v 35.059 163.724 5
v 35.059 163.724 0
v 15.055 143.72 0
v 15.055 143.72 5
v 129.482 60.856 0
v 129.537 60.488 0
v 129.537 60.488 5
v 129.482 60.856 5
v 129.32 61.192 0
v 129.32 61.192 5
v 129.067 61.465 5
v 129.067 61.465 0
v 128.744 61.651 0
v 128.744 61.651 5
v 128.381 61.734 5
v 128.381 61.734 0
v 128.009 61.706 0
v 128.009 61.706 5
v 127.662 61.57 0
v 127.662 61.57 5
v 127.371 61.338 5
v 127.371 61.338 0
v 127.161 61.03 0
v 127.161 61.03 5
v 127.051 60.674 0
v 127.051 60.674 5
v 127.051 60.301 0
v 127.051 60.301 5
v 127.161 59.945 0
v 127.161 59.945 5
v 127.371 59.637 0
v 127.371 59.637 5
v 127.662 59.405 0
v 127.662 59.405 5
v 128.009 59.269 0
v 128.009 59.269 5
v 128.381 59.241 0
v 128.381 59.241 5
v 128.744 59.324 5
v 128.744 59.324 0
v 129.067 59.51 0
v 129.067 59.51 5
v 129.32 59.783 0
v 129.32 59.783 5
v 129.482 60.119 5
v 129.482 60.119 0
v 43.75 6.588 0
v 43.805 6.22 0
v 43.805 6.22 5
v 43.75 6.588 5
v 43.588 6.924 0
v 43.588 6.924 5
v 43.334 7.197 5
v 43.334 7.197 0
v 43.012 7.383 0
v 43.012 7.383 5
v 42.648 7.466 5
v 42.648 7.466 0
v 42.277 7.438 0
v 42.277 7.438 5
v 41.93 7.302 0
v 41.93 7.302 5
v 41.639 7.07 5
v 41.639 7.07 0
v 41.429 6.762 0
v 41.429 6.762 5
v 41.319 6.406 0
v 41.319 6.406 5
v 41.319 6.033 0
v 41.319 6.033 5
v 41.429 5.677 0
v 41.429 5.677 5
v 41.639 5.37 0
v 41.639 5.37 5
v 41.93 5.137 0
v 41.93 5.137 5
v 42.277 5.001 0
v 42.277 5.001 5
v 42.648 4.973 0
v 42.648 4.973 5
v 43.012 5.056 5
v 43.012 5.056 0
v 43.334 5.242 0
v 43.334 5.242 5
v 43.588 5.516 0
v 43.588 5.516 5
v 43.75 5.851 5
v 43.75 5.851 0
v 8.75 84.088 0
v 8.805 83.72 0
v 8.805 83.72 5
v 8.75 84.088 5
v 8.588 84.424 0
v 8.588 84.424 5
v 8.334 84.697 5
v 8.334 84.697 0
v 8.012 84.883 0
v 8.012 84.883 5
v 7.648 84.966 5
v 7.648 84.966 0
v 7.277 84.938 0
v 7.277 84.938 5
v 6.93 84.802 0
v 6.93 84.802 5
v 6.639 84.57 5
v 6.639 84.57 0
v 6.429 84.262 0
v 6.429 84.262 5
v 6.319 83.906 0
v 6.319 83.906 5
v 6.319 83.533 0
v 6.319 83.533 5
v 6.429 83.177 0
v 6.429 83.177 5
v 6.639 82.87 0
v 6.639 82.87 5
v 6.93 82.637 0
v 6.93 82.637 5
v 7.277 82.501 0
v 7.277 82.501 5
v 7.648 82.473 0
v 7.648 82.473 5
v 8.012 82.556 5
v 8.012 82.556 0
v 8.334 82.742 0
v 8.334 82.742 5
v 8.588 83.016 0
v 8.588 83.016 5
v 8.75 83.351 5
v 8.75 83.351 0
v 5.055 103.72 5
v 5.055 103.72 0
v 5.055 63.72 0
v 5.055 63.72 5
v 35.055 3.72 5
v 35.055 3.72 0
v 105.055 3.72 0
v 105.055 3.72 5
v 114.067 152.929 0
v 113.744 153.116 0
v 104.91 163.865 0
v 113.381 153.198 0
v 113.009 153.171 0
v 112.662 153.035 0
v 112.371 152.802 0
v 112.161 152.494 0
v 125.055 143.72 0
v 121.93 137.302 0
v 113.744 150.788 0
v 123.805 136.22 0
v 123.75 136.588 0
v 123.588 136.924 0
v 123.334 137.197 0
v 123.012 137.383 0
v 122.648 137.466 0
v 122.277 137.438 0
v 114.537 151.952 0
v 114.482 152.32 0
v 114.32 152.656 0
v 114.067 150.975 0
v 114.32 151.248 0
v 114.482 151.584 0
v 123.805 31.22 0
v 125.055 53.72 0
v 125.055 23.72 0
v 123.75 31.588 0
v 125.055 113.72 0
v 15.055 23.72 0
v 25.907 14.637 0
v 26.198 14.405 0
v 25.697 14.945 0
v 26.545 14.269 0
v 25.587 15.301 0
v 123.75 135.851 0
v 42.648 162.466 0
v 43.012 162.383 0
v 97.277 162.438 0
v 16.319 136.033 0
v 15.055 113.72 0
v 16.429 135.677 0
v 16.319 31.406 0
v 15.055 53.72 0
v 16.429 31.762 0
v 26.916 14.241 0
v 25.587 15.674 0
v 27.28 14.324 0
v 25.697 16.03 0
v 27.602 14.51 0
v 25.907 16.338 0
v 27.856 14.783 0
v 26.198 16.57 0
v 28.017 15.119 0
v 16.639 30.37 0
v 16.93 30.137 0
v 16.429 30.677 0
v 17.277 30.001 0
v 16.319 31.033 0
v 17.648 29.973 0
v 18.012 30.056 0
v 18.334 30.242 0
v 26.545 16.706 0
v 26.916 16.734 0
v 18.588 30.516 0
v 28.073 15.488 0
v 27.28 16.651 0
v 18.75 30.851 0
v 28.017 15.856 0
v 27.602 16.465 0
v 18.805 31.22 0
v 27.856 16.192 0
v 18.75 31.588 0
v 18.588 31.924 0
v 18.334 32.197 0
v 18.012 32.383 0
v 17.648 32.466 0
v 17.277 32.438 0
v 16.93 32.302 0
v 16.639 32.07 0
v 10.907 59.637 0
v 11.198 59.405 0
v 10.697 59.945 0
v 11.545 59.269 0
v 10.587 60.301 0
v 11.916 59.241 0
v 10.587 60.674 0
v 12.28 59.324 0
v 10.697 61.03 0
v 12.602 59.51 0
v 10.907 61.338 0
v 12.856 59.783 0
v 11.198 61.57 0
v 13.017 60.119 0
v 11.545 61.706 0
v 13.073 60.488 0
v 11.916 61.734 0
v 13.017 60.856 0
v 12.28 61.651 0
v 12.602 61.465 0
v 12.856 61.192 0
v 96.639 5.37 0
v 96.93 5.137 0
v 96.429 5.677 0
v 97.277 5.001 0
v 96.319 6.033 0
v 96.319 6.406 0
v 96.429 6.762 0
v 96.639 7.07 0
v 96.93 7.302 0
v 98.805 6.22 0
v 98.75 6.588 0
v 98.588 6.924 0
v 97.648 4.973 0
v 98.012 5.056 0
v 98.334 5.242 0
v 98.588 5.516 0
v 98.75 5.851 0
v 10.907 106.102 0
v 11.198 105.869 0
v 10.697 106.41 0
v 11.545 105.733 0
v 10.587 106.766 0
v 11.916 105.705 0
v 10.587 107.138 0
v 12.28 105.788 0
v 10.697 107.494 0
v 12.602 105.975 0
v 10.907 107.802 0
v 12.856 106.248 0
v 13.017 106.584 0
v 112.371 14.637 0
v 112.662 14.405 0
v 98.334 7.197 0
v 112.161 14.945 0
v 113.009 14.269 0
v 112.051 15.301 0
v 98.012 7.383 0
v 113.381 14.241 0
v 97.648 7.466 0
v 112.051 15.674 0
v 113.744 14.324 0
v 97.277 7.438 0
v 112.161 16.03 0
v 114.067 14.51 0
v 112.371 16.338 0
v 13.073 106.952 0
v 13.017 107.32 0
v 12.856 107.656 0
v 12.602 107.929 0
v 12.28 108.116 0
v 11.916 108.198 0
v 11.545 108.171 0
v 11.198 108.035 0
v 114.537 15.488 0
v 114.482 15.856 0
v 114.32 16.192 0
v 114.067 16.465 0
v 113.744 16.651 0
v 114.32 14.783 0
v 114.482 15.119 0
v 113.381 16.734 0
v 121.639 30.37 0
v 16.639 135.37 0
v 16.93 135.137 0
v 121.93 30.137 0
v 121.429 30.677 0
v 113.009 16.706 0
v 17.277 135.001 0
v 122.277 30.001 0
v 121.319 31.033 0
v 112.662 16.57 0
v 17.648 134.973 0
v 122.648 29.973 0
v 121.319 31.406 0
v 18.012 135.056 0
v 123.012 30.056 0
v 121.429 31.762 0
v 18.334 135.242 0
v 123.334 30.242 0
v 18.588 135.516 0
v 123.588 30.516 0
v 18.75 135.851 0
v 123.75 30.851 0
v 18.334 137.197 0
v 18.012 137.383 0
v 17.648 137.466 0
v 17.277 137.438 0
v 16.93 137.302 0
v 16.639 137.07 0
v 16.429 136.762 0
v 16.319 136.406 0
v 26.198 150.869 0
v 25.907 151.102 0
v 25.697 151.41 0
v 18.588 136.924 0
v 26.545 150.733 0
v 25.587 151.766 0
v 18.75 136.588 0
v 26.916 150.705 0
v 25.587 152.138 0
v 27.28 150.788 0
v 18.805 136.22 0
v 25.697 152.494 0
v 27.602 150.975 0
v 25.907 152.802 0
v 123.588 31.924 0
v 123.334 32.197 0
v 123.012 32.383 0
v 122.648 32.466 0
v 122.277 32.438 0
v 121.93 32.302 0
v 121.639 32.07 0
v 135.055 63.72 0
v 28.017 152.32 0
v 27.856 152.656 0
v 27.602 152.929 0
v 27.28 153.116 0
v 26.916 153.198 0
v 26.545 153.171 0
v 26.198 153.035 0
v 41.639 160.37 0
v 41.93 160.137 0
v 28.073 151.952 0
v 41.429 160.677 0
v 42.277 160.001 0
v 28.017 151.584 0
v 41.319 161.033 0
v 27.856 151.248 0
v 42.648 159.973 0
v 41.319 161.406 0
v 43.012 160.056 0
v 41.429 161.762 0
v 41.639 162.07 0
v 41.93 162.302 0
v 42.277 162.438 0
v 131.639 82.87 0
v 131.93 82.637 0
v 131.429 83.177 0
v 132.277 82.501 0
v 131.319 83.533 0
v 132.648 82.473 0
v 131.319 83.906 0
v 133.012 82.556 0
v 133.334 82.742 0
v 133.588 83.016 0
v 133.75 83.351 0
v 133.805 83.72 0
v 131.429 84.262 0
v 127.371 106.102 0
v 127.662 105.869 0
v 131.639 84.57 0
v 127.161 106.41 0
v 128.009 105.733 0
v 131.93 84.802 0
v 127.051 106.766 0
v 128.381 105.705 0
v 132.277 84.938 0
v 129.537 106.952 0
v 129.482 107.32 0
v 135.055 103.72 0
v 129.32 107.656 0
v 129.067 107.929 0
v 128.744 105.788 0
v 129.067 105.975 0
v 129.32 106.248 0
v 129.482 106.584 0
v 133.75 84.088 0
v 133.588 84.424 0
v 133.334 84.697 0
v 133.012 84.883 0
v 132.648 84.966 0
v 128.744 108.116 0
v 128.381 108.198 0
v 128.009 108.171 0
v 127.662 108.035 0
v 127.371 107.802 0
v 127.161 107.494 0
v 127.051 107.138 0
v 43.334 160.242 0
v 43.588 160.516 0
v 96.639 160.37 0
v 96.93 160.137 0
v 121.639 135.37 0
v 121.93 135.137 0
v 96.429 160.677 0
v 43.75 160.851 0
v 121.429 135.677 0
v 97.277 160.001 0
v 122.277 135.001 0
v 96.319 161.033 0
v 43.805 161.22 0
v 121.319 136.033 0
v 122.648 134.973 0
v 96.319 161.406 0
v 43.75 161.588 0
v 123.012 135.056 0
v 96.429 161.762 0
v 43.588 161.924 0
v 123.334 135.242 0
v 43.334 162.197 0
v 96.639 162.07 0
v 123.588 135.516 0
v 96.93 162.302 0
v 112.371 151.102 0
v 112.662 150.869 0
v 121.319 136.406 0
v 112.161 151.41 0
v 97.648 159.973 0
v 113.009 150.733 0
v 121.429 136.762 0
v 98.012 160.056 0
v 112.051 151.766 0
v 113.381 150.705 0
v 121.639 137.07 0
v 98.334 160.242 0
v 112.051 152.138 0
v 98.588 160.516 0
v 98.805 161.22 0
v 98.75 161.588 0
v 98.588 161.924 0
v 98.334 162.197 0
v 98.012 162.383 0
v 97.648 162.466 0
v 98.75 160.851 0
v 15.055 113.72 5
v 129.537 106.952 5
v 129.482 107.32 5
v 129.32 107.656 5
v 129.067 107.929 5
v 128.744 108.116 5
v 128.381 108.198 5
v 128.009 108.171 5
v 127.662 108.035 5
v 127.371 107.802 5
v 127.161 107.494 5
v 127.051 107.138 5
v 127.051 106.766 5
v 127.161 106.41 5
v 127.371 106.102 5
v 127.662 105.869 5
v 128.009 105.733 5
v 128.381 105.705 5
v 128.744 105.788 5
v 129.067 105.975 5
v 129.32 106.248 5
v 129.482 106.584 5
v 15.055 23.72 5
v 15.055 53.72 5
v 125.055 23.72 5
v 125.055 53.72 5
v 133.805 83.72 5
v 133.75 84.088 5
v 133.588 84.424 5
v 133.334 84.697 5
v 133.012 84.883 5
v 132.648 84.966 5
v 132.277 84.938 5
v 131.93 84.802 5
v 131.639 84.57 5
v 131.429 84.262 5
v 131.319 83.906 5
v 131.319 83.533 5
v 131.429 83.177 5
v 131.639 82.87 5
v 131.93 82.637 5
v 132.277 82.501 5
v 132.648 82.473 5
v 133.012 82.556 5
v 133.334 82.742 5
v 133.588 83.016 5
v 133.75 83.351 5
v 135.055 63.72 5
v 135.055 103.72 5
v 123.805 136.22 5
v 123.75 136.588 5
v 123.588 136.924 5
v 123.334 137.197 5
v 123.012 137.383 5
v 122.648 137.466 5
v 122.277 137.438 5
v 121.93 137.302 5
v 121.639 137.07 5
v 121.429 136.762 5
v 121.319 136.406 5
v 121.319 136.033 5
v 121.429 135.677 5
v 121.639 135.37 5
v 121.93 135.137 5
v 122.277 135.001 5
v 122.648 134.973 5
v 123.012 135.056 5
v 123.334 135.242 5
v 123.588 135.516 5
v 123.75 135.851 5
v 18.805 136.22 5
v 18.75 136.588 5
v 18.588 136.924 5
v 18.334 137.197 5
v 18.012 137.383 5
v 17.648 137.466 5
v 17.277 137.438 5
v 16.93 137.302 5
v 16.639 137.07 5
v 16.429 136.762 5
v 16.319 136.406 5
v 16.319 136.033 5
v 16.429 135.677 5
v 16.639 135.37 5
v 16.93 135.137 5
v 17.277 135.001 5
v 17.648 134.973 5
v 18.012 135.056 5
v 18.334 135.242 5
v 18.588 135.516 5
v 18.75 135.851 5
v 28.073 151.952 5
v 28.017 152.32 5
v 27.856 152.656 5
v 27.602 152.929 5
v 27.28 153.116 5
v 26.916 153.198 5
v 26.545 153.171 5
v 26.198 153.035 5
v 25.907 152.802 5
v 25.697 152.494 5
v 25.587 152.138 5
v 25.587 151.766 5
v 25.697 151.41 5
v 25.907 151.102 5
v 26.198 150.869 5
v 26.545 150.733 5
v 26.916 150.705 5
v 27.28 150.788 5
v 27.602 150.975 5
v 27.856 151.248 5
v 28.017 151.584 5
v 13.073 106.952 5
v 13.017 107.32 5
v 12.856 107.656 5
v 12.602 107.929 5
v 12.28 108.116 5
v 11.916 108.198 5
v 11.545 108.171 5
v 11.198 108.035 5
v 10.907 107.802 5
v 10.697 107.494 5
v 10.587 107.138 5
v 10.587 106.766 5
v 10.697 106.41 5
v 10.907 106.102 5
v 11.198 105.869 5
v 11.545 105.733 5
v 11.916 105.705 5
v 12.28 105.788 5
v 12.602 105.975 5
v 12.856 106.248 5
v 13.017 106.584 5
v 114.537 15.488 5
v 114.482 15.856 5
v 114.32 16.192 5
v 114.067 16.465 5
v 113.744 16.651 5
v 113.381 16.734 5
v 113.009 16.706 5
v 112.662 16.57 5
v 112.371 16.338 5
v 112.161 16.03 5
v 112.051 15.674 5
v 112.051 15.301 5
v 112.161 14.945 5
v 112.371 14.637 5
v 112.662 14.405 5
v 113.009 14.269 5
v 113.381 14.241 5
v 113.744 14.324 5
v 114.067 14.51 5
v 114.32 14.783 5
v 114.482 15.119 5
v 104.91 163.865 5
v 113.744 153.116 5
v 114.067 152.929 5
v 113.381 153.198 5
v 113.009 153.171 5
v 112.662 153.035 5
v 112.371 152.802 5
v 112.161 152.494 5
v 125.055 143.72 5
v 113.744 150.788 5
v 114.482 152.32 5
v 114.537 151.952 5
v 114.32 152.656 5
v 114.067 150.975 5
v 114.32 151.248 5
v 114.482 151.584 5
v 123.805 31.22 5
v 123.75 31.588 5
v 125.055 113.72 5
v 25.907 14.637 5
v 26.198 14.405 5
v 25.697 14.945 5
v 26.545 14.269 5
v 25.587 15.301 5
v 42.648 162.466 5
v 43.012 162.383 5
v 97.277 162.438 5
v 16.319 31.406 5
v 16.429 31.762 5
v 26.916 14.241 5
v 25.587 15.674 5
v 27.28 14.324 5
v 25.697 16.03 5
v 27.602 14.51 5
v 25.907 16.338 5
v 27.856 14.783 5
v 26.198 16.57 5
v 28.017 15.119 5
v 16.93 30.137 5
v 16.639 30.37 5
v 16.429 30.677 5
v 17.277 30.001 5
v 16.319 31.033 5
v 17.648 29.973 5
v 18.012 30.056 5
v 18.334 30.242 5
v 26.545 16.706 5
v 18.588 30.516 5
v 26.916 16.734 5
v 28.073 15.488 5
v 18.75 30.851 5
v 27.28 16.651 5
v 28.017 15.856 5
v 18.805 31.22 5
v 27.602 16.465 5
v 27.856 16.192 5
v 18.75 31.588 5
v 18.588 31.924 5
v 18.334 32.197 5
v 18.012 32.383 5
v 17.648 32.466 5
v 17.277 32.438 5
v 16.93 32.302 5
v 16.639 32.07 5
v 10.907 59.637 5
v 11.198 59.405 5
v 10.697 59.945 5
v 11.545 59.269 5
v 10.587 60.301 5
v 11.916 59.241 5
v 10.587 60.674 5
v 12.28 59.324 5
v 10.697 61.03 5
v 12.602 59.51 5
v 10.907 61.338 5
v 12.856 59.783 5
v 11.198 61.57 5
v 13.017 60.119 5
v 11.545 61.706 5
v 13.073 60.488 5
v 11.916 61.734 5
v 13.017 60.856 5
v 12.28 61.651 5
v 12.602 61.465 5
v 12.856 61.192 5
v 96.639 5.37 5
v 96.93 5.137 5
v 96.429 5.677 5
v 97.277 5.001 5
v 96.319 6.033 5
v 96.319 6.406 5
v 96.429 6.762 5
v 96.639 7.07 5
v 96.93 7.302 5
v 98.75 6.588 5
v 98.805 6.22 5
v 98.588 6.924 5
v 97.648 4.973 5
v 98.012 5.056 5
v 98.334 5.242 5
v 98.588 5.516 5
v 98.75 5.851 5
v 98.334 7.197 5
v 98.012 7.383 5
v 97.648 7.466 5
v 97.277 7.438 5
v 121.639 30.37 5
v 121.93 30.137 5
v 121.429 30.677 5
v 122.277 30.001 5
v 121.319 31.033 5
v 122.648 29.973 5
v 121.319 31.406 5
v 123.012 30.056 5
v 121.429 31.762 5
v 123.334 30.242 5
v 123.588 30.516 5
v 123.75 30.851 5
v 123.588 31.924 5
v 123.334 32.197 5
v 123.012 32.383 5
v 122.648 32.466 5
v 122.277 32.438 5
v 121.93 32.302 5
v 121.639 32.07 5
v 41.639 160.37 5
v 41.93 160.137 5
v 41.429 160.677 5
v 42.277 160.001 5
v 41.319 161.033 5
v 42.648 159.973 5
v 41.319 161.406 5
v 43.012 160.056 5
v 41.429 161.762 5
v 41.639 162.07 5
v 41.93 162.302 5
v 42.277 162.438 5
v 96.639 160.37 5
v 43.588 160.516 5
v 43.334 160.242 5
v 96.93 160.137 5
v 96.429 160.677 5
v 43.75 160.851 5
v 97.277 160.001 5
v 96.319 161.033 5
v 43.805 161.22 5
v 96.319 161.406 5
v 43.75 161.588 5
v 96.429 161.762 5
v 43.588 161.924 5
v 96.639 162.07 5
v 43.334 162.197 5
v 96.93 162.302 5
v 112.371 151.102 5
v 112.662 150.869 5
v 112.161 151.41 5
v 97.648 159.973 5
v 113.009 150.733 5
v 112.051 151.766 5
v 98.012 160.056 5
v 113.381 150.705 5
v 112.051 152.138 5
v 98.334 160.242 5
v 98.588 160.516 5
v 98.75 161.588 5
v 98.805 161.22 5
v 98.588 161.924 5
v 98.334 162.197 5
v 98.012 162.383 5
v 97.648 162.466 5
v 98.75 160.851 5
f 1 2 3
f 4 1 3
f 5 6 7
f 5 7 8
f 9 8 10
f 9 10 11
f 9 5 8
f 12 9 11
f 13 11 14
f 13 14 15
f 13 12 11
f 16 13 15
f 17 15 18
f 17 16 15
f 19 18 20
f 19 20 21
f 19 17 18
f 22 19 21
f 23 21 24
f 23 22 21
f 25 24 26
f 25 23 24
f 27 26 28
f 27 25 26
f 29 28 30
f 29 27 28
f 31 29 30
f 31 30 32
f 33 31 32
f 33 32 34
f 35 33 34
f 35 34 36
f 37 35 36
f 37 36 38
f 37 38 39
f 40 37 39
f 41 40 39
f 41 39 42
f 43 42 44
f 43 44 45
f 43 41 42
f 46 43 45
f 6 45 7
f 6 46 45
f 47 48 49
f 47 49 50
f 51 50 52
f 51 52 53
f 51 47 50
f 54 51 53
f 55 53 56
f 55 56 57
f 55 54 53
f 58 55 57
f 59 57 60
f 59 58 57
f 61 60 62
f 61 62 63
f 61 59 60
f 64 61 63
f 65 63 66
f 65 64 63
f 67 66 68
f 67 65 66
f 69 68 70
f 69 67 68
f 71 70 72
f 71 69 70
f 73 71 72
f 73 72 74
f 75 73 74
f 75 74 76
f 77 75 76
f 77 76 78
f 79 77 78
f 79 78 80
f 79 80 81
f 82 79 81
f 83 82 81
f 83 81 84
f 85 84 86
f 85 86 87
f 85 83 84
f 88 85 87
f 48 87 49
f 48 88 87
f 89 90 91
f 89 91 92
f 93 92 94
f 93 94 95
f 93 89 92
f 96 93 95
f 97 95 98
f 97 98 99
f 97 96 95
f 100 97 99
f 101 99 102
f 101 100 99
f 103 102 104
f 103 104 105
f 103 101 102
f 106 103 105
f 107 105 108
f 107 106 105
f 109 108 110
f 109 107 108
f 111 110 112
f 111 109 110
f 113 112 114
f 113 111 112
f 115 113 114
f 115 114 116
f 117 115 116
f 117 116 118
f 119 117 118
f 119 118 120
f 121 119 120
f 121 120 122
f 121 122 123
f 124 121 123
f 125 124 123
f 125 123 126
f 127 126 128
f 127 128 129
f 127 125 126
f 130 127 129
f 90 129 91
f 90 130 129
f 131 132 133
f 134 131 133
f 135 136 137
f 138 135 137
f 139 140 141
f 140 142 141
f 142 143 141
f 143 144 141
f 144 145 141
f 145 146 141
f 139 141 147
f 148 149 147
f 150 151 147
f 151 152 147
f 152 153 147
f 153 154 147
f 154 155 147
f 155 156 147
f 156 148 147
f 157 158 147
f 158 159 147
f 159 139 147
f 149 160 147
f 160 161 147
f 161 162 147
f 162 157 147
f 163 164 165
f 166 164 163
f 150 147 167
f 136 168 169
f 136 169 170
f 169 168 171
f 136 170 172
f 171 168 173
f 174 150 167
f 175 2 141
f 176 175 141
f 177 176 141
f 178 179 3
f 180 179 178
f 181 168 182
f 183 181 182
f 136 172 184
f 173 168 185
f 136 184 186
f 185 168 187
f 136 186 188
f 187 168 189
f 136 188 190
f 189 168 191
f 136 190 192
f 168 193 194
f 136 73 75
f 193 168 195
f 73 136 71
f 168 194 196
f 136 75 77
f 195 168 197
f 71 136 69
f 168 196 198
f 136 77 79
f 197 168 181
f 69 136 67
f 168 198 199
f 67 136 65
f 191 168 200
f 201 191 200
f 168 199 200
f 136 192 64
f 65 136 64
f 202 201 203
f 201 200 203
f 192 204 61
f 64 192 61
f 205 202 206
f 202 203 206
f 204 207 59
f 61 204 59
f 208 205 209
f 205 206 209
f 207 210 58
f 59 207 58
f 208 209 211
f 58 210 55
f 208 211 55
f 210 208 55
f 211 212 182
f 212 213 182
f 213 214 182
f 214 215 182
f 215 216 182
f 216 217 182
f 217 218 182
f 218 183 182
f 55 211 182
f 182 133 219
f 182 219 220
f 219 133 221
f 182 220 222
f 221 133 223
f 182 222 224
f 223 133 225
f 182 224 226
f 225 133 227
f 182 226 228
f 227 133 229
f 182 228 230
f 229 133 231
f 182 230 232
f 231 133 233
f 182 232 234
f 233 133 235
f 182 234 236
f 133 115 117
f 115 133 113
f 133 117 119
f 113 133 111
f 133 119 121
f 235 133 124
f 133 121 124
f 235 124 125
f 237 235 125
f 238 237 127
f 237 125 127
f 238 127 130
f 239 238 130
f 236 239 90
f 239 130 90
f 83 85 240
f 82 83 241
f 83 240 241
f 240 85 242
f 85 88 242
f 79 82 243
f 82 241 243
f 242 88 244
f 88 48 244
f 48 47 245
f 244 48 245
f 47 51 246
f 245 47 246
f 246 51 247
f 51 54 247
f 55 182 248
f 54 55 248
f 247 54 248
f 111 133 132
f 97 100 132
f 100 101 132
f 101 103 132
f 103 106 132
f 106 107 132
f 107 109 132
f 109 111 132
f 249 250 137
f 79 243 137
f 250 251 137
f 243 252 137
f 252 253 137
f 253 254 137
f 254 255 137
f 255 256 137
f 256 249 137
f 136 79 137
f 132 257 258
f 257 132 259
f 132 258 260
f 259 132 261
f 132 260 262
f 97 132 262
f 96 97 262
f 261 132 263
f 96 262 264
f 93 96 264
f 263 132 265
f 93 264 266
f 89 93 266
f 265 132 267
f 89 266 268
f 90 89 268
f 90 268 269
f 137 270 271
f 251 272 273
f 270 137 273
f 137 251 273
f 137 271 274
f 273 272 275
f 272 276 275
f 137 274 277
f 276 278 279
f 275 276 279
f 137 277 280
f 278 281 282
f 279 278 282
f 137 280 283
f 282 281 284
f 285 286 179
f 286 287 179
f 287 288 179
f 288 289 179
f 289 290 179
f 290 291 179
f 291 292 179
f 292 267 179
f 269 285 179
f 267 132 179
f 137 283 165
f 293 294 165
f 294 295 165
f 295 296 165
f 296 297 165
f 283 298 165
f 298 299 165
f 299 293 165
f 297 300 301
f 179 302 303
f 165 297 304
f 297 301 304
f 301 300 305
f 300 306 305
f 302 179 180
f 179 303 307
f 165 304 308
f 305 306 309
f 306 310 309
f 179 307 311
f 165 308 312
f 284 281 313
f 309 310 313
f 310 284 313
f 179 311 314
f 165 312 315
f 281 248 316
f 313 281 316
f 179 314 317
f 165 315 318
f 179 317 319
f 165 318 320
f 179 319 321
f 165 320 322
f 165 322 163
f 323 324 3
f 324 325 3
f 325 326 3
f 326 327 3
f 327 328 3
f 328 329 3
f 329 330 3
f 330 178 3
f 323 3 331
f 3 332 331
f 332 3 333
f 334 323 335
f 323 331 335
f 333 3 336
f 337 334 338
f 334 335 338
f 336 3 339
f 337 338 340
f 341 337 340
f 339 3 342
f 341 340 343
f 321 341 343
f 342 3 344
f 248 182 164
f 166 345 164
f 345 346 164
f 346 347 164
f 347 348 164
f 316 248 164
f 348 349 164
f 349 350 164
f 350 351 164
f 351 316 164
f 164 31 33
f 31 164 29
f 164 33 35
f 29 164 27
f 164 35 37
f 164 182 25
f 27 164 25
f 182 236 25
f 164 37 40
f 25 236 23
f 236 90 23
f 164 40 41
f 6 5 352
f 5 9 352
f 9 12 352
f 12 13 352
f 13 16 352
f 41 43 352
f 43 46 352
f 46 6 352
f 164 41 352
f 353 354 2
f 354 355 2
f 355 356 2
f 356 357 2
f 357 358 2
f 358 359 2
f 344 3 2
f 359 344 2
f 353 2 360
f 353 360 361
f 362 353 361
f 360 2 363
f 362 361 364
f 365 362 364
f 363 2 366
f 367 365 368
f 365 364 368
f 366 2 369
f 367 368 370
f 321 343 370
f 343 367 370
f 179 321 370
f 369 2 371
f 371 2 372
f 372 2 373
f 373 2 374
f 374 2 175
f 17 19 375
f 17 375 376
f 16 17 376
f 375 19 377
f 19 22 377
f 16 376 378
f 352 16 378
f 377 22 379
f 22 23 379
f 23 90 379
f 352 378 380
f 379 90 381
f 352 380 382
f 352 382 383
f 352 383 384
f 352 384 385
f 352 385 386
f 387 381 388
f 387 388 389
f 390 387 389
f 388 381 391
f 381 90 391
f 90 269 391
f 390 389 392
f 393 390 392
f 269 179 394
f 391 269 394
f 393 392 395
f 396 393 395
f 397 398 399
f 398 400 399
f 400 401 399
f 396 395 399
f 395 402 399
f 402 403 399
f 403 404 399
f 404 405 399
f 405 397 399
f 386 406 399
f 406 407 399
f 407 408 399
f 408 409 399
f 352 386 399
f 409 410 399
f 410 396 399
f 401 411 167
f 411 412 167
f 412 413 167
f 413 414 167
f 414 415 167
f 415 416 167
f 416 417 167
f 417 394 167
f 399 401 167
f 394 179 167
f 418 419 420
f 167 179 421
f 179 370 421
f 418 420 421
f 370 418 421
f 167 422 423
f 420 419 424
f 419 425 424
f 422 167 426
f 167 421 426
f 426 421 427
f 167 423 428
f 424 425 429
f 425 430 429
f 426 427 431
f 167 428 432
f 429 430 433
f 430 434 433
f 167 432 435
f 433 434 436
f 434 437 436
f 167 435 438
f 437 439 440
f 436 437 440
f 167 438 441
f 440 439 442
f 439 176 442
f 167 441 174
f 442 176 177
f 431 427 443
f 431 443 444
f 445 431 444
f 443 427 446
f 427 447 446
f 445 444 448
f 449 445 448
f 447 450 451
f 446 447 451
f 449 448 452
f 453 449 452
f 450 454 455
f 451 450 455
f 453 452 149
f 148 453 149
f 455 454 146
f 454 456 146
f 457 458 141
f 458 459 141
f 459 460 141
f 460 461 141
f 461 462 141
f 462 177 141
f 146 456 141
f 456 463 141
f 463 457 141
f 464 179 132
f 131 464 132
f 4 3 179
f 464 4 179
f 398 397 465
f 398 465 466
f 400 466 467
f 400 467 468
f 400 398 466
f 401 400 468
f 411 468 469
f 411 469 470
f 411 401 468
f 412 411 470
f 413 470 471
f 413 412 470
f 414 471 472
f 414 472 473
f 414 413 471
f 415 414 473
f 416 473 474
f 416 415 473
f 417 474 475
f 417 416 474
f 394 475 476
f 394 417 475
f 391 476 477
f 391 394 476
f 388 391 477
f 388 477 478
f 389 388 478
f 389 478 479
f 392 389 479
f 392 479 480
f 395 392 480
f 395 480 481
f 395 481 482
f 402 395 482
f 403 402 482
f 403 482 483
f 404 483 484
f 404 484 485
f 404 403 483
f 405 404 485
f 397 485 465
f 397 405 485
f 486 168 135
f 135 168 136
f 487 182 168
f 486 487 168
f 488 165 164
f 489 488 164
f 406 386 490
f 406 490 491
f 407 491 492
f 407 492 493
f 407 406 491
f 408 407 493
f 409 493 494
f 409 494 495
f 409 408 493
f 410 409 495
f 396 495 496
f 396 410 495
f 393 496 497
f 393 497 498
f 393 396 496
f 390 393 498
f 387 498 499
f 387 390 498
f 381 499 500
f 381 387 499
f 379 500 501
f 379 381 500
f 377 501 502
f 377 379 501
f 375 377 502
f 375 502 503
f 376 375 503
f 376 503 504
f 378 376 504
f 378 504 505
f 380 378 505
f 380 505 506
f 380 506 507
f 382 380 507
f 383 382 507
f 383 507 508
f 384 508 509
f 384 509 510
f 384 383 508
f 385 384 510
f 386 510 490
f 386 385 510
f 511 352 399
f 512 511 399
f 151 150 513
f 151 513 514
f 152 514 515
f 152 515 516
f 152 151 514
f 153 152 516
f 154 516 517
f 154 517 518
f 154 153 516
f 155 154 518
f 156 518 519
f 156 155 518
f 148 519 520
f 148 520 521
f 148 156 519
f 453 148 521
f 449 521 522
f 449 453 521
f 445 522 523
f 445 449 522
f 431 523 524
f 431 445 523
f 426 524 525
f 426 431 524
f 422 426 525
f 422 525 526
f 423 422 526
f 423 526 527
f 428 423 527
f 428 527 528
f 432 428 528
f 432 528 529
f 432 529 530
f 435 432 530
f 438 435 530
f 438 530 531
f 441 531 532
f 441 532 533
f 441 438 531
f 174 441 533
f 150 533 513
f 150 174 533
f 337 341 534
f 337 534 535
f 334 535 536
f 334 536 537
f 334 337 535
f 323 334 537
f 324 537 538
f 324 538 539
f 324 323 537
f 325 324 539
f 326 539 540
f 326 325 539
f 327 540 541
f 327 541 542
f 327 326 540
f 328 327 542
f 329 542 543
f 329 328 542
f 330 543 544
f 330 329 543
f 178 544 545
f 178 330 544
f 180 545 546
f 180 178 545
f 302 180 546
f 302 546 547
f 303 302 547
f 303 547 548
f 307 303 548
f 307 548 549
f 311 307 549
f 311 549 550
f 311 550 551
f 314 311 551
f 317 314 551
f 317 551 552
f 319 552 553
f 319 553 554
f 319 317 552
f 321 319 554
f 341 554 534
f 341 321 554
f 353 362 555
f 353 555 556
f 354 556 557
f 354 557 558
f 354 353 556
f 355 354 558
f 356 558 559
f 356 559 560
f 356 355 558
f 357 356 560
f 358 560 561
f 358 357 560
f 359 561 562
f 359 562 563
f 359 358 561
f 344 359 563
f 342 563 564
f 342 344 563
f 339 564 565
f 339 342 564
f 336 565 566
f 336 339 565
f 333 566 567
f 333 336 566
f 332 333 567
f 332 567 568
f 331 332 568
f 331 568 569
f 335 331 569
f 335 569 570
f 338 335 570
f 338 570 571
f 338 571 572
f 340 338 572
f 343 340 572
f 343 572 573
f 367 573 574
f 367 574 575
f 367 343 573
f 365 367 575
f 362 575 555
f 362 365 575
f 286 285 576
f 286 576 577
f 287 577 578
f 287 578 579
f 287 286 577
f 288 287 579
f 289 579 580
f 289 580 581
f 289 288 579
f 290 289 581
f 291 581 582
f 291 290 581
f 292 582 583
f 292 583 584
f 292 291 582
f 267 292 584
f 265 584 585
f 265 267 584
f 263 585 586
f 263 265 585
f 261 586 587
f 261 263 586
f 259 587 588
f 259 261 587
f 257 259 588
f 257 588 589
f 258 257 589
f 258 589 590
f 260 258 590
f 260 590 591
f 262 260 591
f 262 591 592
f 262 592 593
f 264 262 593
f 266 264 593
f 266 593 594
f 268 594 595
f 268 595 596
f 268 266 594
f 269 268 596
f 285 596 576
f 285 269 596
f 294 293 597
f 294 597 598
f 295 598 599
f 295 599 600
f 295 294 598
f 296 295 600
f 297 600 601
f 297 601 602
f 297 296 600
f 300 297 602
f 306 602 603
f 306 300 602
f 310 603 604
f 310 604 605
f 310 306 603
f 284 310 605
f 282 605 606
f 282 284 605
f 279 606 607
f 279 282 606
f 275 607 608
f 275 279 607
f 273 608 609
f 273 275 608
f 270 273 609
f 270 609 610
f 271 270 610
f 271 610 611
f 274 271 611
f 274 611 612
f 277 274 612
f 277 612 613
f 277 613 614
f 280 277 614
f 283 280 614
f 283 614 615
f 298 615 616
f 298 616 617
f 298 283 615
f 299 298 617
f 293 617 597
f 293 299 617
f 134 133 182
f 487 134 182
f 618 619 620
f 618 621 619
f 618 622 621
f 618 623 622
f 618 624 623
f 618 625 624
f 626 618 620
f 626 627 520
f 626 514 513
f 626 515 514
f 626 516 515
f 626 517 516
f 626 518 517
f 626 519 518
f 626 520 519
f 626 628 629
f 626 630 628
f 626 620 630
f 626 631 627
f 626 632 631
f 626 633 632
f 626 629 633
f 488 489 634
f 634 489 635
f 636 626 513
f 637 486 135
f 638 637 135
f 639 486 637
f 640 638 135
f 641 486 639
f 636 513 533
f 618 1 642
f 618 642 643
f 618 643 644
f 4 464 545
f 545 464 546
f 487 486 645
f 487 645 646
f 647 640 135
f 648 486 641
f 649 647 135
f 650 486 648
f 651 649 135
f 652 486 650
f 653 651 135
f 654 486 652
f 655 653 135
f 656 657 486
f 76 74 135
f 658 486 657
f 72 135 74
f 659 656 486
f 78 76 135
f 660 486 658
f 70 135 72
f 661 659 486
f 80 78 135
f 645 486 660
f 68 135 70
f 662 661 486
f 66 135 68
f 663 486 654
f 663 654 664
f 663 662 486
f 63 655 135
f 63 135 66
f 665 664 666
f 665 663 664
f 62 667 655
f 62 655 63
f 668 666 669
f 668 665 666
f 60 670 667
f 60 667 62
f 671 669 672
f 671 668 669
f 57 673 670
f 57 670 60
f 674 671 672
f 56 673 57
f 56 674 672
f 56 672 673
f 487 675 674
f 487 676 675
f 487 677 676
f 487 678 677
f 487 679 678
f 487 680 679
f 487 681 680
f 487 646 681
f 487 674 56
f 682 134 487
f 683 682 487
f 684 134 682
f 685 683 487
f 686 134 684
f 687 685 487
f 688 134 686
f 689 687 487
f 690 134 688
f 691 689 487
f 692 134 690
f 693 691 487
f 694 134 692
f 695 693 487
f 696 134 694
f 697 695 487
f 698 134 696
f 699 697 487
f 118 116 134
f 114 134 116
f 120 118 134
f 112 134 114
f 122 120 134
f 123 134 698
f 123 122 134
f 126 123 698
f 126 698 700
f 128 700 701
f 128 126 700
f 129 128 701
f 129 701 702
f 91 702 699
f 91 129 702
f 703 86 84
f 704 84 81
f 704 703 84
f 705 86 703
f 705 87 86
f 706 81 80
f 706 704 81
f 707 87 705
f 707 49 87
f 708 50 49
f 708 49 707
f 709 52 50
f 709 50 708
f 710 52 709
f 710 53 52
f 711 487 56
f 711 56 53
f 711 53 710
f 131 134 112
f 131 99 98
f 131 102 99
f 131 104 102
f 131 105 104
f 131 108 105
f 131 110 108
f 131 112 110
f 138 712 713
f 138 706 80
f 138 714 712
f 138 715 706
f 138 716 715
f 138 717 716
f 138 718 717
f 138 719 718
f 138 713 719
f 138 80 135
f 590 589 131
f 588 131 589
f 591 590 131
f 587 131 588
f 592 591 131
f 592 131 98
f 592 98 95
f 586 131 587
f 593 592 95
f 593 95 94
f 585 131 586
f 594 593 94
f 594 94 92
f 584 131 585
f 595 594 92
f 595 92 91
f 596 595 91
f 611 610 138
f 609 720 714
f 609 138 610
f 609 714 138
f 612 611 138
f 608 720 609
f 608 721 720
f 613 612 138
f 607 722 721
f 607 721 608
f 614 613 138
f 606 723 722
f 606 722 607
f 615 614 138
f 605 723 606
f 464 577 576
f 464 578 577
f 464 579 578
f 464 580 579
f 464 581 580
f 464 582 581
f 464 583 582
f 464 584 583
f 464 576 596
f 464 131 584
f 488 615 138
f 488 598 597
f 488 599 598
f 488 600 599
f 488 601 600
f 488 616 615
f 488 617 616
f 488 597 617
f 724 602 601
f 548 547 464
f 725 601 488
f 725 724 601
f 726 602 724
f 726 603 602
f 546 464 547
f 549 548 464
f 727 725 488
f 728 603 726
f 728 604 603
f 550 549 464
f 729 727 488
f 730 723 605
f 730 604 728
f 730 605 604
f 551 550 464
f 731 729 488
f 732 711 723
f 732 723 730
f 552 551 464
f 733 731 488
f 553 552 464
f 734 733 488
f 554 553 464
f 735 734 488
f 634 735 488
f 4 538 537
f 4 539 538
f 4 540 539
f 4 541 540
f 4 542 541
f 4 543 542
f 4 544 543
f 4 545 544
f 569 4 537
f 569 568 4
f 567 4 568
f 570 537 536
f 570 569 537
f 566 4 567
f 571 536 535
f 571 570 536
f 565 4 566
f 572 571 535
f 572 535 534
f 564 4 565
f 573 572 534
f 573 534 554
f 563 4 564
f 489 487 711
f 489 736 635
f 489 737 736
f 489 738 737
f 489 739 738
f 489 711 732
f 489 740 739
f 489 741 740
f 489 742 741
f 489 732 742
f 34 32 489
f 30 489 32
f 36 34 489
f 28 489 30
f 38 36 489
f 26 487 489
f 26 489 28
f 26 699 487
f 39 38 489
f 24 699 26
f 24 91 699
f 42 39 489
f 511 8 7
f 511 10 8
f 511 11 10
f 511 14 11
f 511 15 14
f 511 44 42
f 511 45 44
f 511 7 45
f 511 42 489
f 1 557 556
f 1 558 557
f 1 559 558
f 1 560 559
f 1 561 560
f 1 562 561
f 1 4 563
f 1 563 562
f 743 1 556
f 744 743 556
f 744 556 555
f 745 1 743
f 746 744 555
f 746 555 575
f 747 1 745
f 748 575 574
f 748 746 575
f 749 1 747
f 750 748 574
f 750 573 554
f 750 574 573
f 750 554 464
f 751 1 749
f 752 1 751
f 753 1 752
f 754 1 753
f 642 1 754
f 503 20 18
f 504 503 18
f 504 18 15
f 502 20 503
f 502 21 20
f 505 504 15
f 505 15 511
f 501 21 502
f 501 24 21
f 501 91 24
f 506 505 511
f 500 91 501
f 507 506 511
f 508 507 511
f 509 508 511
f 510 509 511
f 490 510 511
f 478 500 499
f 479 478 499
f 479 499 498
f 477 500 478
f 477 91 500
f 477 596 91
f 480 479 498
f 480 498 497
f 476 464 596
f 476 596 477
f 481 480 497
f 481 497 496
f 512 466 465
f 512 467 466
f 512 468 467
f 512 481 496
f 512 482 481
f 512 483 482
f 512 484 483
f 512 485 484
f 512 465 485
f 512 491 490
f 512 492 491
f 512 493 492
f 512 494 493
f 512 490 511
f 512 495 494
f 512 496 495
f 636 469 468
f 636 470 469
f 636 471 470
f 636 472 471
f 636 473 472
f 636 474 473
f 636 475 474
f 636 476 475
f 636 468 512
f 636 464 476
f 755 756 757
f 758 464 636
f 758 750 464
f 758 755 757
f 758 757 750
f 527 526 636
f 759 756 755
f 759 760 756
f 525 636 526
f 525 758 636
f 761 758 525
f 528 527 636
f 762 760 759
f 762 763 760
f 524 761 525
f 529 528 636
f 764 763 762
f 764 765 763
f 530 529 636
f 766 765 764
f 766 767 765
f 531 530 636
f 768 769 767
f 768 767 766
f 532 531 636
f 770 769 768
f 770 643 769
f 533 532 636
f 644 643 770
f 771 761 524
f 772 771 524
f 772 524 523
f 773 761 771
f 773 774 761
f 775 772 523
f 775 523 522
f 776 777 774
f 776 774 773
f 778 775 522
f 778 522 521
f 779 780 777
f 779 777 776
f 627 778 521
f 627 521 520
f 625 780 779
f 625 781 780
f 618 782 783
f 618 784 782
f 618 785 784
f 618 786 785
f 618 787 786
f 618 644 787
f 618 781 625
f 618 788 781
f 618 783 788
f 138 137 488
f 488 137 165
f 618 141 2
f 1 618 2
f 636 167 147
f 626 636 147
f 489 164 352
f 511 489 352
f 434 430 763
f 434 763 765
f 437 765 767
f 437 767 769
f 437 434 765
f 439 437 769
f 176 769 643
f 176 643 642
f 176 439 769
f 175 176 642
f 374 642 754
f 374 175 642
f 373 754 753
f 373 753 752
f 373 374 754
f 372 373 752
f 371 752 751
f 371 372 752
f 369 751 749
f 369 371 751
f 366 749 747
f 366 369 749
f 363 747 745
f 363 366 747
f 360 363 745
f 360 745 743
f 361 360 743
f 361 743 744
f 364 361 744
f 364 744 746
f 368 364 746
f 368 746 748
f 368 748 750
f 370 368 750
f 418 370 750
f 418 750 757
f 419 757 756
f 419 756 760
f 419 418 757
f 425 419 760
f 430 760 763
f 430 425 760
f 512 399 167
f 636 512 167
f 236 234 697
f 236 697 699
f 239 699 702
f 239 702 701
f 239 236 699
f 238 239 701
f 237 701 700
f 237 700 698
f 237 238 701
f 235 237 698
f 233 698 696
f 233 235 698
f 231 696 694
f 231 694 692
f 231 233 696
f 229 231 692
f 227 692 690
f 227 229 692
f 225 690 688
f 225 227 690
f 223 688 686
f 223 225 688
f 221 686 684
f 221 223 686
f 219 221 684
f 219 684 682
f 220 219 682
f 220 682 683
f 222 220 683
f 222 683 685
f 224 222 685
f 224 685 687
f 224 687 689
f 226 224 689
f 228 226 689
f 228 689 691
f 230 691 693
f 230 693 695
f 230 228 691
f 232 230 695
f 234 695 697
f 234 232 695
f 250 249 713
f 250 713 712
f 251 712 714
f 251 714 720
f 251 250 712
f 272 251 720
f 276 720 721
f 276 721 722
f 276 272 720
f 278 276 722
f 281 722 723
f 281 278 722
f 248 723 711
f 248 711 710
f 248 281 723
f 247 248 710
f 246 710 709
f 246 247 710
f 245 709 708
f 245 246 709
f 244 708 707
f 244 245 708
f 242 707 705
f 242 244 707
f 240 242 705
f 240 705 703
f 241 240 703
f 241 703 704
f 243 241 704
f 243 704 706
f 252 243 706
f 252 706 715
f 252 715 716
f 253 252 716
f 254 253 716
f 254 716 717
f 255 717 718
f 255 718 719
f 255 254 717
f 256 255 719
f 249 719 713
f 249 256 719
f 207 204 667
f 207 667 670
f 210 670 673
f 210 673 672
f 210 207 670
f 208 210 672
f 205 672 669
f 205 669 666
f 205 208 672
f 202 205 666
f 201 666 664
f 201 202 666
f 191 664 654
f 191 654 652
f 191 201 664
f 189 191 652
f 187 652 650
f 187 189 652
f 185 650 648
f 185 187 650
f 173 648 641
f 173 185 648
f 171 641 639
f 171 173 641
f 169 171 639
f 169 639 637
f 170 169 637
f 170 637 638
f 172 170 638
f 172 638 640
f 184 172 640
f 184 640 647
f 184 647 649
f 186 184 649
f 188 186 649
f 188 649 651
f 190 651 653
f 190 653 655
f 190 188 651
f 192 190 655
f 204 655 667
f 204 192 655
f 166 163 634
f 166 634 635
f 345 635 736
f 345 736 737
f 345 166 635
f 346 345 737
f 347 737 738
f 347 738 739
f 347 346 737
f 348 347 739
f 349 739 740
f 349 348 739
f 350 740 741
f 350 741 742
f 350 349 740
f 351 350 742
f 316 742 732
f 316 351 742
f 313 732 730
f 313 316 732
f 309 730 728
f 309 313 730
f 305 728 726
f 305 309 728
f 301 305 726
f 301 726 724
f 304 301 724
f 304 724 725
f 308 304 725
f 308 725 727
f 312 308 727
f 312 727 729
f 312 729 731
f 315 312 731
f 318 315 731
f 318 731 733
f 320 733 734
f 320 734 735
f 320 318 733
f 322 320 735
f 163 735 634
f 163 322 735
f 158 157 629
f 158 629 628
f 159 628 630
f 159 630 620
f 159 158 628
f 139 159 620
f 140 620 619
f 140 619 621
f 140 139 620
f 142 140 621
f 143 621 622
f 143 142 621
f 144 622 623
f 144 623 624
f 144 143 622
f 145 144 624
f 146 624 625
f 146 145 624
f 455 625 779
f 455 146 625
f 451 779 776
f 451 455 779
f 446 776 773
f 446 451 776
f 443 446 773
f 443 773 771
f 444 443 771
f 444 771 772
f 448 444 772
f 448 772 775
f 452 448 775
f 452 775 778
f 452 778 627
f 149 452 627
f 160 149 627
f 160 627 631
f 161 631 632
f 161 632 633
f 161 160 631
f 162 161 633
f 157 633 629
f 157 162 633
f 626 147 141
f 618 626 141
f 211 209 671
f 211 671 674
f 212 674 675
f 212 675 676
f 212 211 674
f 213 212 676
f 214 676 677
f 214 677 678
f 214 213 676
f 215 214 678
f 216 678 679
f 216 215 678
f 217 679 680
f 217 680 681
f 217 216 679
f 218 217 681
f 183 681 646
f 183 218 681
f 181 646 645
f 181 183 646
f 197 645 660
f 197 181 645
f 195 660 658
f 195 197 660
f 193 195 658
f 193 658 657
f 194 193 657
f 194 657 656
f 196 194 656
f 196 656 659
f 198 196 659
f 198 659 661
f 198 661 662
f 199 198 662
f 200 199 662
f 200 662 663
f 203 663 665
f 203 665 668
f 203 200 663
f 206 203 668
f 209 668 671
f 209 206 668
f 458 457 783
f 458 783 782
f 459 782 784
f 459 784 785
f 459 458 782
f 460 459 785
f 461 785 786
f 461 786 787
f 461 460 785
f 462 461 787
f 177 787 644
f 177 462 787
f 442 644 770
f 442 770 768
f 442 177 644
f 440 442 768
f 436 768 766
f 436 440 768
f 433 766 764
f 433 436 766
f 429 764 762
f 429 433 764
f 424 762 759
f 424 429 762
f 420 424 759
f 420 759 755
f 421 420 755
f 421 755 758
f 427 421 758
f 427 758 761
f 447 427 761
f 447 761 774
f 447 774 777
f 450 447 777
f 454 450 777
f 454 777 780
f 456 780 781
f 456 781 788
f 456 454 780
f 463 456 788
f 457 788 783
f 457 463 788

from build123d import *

# Parameters (mm, degrees)
MODEL_R             = 1.25
BOSS_EXTRUDE1_DEPTH = 5


with BuildPart() as part:
    # Model → Boss-Extrude1 (new body)
    with BuildSketch(Plane.XY):
        Polygon((105.055071144, 3.719759624), (125.055071144, 23.719759624), (125.055071144, 53.719759624), (135.055071144, 63.719759624), (135.055071144, 103.719759624), (125.055071144, 113.719759624), (125.055071144, 143.719759624), (104.909839245, 163.864991523), (35.058830231, 163.723518711), (15.055071144, 143.719759624), (15.055071144, 113.719759624), (5.055071144, 103.719759624), (5.055071144, 63.719759624), (15.055071144, 53.719759624), (15.055071144, 23.719759624), (35.055071144, 3.719759624), align=None)
        with Locations((97.555071144, 6.219759624)):
            Circle(MODEL_R, mode=Mode.SUBTRACT)
        with Locations((122.555071144, 31.219759624)):
            Circle(MODEL_R, mode=Mode.SUBTRACT)
        with Locations((113.287304191, 15.487526577)):
            Circle(MODEL_R, mode=Mode.SUBTRACT)
        with Locations((42.555071144, 6.219759624)):
            Circle(MODEL_R, mode=Mode.SUBTRACT)
        with Locations((17.555071144, 31.219759624)):
            Circle(MODEL_R, mode=Mode.SUBTRACT)
        with Locations((26.822838097, 15.487526577)):
            Circle(MODEL_R, mode=Mode.SUBTRACT)
        with Locations((97.555071144, 161.219759624)):
            Circle(MODEL_R, mode=Mode.SUBTRACT)
        with Locations((122.555071144, 136.219759624)):
            Circle(MODEL_R, mode=Mode.SUBTRACT)
        with Locations((113.287304191, 151.951992671)):
            Circle(MODEL_R, mode=Mode.SUBTRACT)
        with Locations((42.555071144, 161.219759624)):
            Circle(MODEL_R, mode=Mode.SUBTRACT)
        with Locations((17.555071144, 136.219759624)):
            Circle(MODEL_R, mode=Mode.SUBTRACT)
        with Locations((26.822838097, 151.951992671)):
            Circle(MODEL_R, mode=Mode.SUBTRACT)
        with Locations((11.822838097, 60.487526577)):
            Circle(MODEL_R, mode=Mode.SUBTRACT)
        with Locations((7.555071144, 83.719759624)):
            Circle(MODEL_R, mode=Mode.SUBTRACT)
        with Locations((11.822838097, 106.951992671)):
            Circle(MODEL_R, mode=Mode.SUBTRACT)
        with Locations((128.287304191, 60.487526577)):
            Circle(MODEL_R, mode=Mode.SUBTRACT)
        with Locations((132.555071144, 83.719759624)):
            Circle(MODEL_R, mode=Mode.SUBTRACT)
        with Locations((128.287304191, 106.951992671)):
            Circle(MODEL_R, mode=Mode.SUBTRACT)
    extrude(amount=BOSS_EXTRUDE1_DEPTH)


solid = part.part
